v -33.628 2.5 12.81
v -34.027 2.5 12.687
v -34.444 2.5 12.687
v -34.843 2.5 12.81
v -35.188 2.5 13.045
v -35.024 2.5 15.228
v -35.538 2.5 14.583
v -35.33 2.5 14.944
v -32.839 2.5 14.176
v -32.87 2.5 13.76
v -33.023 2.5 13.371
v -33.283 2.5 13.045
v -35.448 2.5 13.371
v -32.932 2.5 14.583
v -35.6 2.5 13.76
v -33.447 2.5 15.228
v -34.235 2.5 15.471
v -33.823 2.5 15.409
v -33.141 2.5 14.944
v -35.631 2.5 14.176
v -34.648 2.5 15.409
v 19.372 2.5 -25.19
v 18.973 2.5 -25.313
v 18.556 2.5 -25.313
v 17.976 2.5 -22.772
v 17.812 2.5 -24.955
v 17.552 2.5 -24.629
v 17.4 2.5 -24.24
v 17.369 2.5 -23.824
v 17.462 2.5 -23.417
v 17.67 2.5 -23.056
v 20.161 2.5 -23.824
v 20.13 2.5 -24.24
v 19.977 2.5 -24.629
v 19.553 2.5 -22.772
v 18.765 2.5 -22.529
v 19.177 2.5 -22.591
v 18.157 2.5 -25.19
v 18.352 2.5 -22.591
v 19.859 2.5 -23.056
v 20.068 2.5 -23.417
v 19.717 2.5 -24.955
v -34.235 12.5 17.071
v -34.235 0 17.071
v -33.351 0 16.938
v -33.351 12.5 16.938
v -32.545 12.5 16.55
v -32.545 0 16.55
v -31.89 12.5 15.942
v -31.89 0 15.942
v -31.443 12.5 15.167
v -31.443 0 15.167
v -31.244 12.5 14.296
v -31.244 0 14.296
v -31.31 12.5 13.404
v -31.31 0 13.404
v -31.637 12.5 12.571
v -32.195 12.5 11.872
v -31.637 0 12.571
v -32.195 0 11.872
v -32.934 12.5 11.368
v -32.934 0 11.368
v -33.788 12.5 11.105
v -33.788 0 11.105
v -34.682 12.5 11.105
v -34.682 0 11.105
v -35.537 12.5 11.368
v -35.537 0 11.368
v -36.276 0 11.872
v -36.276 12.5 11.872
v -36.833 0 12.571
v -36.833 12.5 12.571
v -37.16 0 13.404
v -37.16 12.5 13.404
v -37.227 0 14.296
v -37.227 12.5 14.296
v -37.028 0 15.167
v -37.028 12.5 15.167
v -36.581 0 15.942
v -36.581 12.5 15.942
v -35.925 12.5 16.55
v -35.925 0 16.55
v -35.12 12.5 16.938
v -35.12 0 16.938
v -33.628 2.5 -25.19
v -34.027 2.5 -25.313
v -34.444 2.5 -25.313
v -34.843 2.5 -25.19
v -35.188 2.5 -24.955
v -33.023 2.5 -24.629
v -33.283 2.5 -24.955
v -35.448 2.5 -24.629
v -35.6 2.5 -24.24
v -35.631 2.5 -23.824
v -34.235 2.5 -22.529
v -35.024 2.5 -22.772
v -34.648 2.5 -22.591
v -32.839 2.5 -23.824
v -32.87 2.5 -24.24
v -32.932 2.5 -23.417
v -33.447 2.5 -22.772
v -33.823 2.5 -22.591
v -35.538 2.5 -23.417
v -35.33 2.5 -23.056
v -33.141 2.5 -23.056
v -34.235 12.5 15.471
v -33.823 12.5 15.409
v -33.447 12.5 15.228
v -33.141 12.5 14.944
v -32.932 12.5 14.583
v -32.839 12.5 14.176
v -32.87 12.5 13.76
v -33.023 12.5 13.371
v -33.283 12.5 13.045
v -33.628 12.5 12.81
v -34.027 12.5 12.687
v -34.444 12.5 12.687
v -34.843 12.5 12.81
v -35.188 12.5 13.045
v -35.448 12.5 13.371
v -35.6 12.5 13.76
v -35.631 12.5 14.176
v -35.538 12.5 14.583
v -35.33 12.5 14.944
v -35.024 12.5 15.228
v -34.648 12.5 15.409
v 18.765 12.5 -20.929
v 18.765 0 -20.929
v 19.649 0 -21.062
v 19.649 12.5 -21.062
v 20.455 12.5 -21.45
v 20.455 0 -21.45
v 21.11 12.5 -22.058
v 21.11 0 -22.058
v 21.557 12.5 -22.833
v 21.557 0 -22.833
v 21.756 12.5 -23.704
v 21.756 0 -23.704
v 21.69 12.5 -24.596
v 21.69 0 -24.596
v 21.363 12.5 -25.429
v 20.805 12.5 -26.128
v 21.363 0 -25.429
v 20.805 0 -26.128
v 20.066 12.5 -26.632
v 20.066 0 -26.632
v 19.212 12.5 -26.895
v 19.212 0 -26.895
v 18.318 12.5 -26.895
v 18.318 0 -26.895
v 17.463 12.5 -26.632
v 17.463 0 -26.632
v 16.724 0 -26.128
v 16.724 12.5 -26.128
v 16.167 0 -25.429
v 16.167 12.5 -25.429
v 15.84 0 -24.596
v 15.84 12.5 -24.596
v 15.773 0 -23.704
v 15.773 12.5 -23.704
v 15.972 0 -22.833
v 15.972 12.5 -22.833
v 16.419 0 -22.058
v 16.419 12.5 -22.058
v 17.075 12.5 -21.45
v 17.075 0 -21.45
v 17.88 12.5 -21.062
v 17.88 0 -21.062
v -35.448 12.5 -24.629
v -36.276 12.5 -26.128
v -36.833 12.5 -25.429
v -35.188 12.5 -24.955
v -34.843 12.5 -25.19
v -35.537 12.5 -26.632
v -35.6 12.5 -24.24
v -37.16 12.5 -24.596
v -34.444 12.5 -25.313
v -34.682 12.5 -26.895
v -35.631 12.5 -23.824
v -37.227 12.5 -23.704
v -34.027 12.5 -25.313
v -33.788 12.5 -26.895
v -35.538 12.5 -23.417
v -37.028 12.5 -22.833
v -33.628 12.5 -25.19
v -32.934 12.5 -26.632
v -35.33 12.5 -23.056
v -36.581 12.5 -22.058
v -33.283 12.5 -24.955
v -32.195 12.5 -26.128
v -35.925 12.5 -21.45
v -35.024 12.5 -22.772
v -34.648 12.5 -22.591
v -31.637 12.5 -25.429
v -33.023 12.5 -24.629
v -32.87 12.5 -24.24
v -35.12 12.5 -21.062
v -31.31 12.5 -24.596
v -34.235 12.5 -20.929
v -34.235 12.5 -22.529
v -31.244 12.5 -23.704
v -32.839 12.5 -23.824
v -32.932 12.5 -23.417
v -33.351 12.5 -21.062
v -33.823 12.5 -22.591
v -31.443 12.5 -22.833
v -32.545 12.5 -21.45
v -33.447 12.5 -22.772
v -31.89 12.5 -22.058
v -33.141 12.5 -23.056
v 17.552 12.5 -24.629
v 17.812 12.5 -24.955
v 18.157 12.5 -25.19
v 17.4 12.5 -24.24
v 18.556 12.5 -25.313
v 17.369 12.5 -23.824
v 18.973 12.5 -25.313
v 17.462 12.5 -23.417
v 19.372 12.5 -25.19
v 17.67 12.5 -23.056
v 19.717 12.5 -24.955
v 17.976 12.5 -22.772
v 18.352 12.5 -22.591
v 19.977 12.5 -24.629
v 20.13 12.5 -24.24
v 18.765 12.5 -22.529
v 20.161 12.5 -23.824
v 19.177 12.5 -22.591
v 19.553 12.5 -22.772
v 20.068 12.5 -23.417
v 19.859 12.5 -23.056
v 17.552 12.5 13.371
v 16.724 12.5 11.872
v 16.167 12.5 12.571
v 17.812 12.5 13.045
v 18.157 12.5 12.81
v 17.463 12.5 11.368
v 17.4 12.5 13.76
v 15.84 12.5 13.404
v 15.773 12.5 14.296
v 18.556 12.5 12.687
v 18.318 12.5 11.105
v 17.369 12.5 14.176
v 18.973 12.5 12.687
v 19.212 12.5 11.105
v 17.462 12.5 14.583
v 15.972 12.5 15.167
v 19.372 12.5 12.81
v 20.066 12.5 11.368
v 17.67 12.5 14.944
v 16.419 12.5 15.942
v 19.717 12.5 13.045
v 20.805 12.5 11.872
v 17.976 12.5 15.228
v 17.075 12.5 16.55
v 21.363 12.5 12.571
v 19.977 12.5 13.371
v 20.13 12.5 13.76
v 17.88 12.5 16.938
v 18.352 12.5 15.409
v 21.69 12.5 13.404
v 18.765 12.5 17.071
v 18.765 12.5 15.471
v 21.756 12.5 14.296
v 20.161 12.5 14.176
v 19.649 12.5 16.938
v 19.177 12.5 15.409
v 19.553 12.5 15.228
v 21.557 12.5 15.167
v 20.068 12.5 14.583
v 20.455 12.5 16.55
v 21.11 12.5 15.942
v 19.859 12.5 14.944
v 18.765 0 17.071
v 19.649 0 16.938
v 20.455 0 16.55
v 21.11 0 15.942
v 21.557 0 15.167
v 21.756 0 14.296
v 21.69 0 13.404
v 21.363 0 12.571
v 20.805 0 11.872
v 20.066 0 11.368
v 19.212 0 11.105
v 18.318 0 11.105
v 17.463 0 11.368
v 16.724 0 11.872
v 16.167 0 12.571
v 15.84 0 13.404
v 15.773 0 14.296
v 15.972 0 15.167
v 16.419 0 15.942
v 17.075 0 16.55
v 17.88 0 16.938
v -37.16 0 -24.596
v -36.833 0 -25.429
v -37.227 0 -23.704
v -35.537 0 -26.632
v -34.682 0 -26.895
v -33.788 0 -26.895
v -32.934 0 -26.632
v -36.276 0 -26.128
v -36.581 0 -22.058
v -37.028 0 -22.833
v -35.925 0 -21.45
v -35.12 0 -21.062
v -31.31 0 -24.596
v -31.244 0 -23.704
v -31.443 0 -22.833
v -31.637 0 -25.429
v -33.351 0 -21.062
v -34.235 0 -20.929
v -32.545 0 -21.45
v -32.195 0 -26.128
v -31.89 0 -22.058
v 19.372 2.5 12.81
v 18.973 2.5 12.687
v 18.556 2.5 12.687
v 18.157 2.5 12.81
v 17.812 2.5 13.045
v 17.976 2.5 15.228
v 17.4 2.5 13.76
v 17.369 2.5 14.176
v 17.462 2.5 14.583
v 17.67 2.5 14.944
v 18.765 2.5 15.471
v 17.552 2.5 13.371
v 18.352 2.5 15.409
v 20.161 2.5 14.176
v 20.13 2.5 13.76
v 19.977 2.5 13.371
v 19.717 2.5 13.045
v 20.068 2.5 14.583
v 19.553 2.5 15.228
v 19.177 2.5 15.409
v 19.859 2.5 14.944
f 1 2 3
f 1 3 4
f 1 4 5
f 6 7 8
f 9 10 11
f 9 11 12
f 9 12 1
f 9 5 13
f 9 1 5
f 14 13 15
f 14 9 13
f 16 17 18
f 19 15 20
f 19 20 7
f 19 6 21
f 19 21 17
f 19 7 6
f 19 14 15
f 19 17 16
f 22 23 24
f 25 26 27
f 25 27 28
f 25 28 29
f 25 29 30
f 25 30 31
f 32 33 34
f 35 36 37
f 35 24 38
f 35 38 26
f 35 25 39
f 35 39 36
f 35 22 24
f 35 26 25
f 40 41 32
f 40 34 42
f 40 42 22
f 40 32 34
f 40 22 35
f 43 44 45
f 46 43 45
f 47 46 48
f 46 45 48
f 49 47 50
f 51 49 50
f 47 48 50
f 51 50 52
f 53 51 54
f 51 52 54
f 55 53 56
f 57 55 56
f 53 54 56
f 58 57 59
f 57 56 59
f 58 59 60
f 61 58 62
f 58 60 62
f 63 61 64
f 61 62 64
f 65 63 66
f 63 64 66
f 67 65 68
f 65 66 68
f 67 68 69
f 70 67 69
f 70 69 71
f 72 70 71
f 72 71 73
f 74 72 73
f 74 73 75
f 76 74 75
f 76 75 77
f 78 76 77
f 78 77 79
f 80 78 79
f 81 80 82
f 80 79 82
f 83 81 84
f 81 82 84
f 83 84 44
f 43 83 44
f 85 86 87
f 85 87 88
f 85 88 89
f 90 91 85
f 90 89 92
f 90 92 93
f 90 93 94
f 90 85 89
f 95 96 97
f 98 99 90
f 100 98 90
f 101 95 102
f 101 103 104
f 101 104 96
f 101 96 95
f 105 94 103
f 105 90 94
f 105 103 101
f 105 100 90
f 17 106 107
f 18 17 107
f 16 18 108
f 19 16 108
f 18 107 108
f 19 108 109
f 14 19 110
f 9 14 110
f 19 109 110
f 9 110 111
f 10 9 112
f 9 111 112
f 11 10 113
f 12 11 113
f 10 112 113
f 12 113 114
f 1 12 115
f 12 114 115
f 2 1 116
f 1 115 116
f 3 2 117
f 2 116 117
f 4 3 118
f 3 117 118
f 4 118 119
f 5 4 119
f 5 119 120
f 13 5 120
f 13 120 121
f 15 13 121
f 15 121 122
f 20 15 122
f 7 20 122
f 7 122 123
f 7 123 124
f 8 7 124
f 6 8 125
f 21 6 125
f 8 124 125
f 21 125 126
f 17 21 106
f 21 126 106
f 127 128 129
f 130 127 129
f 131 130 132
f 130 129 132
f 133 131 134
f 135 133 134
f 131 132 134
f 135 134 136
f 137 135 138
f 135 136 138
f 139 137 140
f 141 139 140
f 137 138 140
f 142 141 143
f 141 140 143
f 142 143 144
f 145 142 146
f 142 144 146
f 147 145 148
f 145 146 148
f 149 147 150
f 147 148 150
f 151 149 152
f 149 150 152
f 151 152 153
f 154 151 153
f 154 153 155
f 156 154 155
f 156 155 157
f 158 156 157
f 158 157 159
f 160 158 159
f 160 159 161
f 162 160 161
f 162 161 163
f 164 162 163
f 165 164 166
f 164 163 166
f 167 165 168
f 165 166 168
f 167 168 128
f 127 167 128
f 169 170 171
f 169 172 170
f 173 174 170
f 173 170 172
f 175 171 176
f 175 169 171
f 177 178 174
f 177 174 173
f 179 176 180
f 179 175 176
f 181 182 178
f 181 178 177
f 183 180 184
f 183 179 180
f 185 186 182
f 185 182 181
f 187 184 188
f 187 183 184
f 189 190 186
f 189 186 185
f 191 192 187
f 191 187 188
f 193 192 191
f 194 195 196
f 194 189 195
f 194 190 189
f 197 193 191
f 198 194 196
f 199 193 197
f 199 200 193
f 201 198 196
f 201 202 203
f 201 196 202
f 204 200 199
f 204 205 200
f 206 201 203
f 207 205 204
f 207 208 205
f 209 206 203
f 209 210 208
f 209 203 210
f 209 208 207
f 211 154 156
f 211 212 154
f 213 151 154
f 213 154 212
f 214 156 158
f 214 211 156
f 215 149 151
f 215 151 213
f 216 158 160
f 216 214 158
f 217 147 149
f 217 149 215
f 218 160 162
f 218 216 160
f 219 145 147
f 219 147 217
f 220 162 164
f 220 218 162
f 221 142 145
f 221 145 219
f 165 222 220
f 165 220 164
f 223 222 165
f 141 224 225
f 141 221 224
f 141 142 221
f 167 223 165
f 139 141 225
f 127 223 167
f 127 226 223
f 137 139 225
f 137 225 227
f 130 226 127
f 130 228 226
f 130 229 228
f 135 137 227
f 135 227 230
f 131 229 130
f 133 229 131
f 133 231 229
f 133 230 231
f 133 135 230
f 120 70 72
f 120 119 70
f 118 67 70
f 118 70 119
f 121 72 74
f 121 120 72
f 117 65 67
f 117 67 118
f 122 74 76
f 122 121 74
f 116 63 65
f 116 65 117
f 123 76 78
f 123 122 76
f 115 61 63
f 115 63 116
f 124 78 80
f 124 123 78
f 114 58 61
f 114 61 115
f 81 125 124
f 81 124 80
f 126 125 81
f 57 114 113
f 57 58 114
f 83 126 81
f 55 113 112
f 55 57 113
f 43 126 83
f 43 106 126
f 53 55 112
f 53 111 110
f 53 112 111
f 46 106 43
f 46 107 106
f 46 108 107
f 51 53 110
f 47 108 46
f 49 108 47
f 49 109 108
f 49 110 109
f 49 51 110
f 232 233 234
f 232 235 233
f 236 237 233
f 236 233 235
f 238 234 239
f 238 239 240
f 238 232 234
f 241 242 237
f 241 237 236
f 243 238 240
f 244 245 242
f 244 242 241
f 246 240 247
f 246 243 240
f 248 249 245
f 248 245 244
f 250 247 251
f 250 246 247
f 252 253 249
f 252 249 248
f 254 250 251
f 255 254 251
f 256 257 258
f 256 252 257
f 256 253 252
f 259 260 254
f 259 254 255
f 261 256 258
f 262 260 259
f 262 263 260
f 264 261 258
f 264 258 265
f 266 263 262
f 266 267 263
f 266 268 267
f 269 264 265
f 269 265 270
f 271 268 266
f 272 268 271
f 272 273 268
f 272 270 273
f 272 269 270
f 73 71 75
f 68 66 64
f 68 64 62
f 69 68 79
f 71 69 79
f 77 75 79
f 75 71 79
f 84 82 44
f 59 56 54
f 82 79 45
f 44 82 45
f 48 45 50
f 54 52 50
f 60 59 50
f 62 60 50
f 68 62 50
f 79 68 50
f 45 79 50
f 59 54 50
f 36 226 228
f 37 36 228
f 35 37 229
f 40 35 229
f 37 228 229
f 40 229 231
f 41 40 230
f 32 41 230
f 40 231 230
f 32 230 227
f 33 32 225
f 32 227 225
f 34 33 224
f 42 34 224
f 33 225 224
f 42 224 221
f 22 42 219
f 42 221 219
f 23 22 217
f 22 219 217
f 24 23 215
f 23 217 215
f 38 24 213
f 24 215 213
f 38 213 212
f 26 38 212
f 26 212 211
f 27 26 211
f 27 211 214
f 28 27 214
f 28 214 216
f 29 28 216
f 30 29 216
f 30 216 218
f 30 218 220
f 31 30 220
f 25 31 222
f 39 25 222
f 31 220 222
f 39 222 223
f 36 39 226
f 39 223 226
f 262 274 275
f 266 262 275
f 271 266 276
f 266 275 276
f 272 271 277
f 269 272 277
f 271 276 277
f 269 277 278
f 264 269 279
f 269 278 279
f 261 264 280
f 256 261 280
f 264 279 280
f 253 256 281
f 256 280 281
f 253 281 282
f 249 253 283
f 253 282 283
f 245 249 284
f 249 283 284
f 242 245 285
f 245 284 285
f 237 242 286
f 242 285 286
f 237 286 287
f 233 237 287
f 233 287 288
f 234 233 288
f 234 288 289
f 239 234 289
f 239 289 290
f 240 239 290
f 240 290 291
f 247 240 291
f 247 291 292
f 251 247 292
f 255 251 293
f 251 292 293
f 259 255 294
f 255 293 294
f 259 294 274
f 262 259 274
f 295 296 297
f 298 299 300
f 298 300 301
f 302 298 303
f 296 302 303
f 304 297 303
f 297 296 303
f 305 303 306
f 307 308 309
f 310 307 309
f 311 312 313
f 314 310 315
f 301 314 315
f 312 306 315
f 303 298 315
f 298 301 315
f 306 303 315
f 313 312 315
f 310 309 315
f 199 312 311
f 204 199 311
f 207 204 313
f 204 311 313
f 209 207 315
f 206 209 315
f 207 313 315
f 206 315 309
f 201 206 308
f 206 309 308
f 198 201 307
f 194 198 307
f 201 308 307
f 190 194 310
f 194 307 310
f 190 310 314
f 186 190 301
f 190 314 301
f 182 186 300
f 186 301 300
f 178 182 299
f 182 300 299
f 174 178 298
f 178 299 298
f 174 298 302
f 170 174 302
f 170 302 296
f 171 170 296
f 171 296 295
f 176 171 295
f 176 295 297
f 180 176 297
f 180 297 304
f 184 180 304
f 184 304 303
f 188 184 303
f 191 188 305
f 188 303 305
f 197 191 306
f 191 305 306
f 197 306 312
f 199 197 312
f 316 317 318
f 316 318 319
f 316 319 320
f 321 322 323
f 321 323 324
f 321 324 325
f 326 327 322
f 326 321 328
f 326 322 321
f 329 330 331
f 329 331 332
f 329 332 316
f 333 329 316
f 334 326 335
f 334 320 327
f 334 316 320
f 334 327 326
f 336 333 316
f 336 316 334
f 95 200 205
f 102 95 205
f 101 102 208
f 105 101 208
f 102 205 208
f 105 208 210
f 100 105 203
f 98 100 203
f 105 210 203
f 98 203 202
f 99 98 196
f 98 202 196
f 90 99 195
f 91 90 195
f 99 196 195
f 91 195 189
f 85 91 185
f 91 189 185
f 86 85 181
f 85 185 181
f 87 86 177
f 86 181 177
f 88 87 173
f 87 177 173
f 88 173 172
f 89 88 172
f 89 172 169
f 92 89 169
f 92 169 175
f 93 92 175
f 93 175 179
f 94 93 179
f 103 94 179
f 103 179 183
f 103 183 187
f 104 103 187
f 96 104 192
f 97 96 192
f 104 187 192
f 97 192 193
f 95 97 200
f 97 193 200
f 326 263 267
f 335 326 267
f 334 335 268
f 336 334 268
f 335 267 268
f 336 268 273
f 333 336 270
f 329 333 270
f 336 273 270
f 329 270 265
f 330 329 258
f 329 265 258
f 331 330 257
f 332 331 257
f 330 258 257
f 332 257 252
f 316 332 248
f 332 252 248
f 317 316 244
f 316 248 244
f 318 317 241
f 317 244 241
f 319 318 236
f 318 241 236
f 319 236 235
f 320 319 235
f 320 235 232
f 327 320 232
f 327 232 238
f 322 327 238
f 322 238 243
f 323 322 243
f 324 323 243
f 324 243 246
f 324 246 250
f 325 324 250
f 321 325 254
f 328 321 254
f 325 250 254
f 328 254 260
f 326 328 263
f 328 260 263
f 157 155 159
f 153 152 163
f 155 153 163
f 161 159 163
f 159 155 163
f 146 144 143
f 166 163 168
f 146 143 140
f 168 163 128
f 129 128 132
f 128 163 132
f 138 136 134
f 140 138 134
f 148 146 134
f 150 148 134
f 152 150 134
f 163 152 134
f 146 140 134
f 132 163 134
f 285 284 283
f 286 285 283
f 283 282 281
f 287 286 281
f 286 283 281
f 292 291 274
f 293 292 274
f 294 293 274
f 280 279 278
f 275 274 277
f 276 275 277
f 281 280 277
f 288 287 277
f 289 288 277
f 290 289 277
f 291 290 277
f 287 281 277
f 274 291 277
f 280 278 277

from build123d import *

# Parameters (mm, degrees)
SKETCH1_R             = 3
BOSS_EXTRUDE1_DEPTH   = 12.5
BOSS_EXTRUDE1_2_DEPTH = 12.5
BOSS_EXTRUDE1_3_DEPTH = 12.5
BOSS_EXTRUDE1_4_DEPTH = 12.5
SKETCH2_R             = 1.4
CUT_EXTRUDE1_DEPTH    = 10


with BuildPart() as part:
    # Sketch1 → Boss-Extrude1 (new body)
    with BuildSketch(Plane(origin=(0, 0, 0), x_dir=(1, 0, 0), z_dir=(0, 1, 0))):
        with Locations(Location((-34.235262899, 23.928667677, 0), (0, 0, 270))):
            Circle(SKETCH1_R)
    extrude(amount=BOSS_EXTRUDE1_DEPTH)


with BuildPart() as body_2:
    # Sketch1 → Boss-Extrude1 2 (new body)
    with BuildSketch(Plane(origin=(0, 0, 0), x_dir=(1, 0, 0), z_dir=(0, 1, 0))):
        with Locations(Location((-34.235262899, -14.071332323, 0), (0, 0, 270))):
            Circle(SKETCH1_R)
    extrude(amount=BOSS_EXTRUDE1_2_DEPTH)


with BuildPart() as body_3:
    # Sketch1 → Boss-Extrude1 3 (new body)
    with BuildSketch(Plane(origin=(0, 0, 0), x_dir=(1, 0, 0), z_dir=(0, 1, 0))):
        with Locations(Location((18.764737101, -14.071332323, 0), (0, 0, 270))):
            Circle(SKETCH1_R)
    extrude(amount=BOSS_EXTRUDE1_3_DEPTH)


with BuildPart() as body_4:
    # Sketch1 → Boss-Extrude1 4 (new body)
    with BuildSketch(Plane(origin=(0, 0, 0), x_dir=(1, 0, 0), z_dir=(0, 1, 0))):
        with Locations(Location((18.764737101, 23.928667677, 0), (0, 0, 270))):
            Circle(SKETCH1_R)
    extrude(amount=BOSS_EXTRUDE1_4_DEPTH)


with BuildPart() as cut_extrude1_tool:
    # Sketch2 → Cut-Extrude1 (new body)
    with BuildSketch(Plane(origin=(0, 12.5, 0), x_dir=(1, 0, 0), z_dir=(0, 1, 0))):
        with Locations(Location((-34.235262899, 23.928667677, 0), (0, 0, 270))):
            Circle(SKETCH2_R)
        with Locations(Location((18.764737101, 23.928667677, 0), (0, 0, 270))):
            Circle(SKETCH2_R)
        with Locations(Location((18.764737101, -14.071332323, 0), (0, 0, 270))):
            Circle(SKETCH2_R)
        with Locations(Location((-34.235262899, -14.071332323, 0), (0, 0, 270))):
            Circle(SKETCH2_R)
    extrude(amount=-CUT_EXTRUDE1_DEPTH)


with BuildPart() as part_1:
    add(part.part)

    # Cut-Extrude1: cut by cut_extrude1_tool
    add(cut_extrude1_tool.part, mode=Mode.SUBTRACT)


with BuildPart() as body_2_1:
    add(body_2.part)

    # Cut-Extrude1: cut by cut_extrude1_tool
    add(cut_extrude1_tool.part, mode=Mode.SUBTRACT)


with BuildPart() as body_3_1:
    add(body_3.part)

    # Cut-Extrude1: cut by cut_extrude1_tool
    add(cut_extrude1_tool.part, mode=Mode.SUBTRACT)


with BuildPart() as body_4_1:
    add(body_4.part)

    # Cut-Extrude1: cut by cut_extrude1_tool
    add(cut_extrude1_tool.part, mode=Mode.SUBTRACT)


solid = Compound([part_1.part, body_2_1.part, body_3_1.part, body_4_1.part])
